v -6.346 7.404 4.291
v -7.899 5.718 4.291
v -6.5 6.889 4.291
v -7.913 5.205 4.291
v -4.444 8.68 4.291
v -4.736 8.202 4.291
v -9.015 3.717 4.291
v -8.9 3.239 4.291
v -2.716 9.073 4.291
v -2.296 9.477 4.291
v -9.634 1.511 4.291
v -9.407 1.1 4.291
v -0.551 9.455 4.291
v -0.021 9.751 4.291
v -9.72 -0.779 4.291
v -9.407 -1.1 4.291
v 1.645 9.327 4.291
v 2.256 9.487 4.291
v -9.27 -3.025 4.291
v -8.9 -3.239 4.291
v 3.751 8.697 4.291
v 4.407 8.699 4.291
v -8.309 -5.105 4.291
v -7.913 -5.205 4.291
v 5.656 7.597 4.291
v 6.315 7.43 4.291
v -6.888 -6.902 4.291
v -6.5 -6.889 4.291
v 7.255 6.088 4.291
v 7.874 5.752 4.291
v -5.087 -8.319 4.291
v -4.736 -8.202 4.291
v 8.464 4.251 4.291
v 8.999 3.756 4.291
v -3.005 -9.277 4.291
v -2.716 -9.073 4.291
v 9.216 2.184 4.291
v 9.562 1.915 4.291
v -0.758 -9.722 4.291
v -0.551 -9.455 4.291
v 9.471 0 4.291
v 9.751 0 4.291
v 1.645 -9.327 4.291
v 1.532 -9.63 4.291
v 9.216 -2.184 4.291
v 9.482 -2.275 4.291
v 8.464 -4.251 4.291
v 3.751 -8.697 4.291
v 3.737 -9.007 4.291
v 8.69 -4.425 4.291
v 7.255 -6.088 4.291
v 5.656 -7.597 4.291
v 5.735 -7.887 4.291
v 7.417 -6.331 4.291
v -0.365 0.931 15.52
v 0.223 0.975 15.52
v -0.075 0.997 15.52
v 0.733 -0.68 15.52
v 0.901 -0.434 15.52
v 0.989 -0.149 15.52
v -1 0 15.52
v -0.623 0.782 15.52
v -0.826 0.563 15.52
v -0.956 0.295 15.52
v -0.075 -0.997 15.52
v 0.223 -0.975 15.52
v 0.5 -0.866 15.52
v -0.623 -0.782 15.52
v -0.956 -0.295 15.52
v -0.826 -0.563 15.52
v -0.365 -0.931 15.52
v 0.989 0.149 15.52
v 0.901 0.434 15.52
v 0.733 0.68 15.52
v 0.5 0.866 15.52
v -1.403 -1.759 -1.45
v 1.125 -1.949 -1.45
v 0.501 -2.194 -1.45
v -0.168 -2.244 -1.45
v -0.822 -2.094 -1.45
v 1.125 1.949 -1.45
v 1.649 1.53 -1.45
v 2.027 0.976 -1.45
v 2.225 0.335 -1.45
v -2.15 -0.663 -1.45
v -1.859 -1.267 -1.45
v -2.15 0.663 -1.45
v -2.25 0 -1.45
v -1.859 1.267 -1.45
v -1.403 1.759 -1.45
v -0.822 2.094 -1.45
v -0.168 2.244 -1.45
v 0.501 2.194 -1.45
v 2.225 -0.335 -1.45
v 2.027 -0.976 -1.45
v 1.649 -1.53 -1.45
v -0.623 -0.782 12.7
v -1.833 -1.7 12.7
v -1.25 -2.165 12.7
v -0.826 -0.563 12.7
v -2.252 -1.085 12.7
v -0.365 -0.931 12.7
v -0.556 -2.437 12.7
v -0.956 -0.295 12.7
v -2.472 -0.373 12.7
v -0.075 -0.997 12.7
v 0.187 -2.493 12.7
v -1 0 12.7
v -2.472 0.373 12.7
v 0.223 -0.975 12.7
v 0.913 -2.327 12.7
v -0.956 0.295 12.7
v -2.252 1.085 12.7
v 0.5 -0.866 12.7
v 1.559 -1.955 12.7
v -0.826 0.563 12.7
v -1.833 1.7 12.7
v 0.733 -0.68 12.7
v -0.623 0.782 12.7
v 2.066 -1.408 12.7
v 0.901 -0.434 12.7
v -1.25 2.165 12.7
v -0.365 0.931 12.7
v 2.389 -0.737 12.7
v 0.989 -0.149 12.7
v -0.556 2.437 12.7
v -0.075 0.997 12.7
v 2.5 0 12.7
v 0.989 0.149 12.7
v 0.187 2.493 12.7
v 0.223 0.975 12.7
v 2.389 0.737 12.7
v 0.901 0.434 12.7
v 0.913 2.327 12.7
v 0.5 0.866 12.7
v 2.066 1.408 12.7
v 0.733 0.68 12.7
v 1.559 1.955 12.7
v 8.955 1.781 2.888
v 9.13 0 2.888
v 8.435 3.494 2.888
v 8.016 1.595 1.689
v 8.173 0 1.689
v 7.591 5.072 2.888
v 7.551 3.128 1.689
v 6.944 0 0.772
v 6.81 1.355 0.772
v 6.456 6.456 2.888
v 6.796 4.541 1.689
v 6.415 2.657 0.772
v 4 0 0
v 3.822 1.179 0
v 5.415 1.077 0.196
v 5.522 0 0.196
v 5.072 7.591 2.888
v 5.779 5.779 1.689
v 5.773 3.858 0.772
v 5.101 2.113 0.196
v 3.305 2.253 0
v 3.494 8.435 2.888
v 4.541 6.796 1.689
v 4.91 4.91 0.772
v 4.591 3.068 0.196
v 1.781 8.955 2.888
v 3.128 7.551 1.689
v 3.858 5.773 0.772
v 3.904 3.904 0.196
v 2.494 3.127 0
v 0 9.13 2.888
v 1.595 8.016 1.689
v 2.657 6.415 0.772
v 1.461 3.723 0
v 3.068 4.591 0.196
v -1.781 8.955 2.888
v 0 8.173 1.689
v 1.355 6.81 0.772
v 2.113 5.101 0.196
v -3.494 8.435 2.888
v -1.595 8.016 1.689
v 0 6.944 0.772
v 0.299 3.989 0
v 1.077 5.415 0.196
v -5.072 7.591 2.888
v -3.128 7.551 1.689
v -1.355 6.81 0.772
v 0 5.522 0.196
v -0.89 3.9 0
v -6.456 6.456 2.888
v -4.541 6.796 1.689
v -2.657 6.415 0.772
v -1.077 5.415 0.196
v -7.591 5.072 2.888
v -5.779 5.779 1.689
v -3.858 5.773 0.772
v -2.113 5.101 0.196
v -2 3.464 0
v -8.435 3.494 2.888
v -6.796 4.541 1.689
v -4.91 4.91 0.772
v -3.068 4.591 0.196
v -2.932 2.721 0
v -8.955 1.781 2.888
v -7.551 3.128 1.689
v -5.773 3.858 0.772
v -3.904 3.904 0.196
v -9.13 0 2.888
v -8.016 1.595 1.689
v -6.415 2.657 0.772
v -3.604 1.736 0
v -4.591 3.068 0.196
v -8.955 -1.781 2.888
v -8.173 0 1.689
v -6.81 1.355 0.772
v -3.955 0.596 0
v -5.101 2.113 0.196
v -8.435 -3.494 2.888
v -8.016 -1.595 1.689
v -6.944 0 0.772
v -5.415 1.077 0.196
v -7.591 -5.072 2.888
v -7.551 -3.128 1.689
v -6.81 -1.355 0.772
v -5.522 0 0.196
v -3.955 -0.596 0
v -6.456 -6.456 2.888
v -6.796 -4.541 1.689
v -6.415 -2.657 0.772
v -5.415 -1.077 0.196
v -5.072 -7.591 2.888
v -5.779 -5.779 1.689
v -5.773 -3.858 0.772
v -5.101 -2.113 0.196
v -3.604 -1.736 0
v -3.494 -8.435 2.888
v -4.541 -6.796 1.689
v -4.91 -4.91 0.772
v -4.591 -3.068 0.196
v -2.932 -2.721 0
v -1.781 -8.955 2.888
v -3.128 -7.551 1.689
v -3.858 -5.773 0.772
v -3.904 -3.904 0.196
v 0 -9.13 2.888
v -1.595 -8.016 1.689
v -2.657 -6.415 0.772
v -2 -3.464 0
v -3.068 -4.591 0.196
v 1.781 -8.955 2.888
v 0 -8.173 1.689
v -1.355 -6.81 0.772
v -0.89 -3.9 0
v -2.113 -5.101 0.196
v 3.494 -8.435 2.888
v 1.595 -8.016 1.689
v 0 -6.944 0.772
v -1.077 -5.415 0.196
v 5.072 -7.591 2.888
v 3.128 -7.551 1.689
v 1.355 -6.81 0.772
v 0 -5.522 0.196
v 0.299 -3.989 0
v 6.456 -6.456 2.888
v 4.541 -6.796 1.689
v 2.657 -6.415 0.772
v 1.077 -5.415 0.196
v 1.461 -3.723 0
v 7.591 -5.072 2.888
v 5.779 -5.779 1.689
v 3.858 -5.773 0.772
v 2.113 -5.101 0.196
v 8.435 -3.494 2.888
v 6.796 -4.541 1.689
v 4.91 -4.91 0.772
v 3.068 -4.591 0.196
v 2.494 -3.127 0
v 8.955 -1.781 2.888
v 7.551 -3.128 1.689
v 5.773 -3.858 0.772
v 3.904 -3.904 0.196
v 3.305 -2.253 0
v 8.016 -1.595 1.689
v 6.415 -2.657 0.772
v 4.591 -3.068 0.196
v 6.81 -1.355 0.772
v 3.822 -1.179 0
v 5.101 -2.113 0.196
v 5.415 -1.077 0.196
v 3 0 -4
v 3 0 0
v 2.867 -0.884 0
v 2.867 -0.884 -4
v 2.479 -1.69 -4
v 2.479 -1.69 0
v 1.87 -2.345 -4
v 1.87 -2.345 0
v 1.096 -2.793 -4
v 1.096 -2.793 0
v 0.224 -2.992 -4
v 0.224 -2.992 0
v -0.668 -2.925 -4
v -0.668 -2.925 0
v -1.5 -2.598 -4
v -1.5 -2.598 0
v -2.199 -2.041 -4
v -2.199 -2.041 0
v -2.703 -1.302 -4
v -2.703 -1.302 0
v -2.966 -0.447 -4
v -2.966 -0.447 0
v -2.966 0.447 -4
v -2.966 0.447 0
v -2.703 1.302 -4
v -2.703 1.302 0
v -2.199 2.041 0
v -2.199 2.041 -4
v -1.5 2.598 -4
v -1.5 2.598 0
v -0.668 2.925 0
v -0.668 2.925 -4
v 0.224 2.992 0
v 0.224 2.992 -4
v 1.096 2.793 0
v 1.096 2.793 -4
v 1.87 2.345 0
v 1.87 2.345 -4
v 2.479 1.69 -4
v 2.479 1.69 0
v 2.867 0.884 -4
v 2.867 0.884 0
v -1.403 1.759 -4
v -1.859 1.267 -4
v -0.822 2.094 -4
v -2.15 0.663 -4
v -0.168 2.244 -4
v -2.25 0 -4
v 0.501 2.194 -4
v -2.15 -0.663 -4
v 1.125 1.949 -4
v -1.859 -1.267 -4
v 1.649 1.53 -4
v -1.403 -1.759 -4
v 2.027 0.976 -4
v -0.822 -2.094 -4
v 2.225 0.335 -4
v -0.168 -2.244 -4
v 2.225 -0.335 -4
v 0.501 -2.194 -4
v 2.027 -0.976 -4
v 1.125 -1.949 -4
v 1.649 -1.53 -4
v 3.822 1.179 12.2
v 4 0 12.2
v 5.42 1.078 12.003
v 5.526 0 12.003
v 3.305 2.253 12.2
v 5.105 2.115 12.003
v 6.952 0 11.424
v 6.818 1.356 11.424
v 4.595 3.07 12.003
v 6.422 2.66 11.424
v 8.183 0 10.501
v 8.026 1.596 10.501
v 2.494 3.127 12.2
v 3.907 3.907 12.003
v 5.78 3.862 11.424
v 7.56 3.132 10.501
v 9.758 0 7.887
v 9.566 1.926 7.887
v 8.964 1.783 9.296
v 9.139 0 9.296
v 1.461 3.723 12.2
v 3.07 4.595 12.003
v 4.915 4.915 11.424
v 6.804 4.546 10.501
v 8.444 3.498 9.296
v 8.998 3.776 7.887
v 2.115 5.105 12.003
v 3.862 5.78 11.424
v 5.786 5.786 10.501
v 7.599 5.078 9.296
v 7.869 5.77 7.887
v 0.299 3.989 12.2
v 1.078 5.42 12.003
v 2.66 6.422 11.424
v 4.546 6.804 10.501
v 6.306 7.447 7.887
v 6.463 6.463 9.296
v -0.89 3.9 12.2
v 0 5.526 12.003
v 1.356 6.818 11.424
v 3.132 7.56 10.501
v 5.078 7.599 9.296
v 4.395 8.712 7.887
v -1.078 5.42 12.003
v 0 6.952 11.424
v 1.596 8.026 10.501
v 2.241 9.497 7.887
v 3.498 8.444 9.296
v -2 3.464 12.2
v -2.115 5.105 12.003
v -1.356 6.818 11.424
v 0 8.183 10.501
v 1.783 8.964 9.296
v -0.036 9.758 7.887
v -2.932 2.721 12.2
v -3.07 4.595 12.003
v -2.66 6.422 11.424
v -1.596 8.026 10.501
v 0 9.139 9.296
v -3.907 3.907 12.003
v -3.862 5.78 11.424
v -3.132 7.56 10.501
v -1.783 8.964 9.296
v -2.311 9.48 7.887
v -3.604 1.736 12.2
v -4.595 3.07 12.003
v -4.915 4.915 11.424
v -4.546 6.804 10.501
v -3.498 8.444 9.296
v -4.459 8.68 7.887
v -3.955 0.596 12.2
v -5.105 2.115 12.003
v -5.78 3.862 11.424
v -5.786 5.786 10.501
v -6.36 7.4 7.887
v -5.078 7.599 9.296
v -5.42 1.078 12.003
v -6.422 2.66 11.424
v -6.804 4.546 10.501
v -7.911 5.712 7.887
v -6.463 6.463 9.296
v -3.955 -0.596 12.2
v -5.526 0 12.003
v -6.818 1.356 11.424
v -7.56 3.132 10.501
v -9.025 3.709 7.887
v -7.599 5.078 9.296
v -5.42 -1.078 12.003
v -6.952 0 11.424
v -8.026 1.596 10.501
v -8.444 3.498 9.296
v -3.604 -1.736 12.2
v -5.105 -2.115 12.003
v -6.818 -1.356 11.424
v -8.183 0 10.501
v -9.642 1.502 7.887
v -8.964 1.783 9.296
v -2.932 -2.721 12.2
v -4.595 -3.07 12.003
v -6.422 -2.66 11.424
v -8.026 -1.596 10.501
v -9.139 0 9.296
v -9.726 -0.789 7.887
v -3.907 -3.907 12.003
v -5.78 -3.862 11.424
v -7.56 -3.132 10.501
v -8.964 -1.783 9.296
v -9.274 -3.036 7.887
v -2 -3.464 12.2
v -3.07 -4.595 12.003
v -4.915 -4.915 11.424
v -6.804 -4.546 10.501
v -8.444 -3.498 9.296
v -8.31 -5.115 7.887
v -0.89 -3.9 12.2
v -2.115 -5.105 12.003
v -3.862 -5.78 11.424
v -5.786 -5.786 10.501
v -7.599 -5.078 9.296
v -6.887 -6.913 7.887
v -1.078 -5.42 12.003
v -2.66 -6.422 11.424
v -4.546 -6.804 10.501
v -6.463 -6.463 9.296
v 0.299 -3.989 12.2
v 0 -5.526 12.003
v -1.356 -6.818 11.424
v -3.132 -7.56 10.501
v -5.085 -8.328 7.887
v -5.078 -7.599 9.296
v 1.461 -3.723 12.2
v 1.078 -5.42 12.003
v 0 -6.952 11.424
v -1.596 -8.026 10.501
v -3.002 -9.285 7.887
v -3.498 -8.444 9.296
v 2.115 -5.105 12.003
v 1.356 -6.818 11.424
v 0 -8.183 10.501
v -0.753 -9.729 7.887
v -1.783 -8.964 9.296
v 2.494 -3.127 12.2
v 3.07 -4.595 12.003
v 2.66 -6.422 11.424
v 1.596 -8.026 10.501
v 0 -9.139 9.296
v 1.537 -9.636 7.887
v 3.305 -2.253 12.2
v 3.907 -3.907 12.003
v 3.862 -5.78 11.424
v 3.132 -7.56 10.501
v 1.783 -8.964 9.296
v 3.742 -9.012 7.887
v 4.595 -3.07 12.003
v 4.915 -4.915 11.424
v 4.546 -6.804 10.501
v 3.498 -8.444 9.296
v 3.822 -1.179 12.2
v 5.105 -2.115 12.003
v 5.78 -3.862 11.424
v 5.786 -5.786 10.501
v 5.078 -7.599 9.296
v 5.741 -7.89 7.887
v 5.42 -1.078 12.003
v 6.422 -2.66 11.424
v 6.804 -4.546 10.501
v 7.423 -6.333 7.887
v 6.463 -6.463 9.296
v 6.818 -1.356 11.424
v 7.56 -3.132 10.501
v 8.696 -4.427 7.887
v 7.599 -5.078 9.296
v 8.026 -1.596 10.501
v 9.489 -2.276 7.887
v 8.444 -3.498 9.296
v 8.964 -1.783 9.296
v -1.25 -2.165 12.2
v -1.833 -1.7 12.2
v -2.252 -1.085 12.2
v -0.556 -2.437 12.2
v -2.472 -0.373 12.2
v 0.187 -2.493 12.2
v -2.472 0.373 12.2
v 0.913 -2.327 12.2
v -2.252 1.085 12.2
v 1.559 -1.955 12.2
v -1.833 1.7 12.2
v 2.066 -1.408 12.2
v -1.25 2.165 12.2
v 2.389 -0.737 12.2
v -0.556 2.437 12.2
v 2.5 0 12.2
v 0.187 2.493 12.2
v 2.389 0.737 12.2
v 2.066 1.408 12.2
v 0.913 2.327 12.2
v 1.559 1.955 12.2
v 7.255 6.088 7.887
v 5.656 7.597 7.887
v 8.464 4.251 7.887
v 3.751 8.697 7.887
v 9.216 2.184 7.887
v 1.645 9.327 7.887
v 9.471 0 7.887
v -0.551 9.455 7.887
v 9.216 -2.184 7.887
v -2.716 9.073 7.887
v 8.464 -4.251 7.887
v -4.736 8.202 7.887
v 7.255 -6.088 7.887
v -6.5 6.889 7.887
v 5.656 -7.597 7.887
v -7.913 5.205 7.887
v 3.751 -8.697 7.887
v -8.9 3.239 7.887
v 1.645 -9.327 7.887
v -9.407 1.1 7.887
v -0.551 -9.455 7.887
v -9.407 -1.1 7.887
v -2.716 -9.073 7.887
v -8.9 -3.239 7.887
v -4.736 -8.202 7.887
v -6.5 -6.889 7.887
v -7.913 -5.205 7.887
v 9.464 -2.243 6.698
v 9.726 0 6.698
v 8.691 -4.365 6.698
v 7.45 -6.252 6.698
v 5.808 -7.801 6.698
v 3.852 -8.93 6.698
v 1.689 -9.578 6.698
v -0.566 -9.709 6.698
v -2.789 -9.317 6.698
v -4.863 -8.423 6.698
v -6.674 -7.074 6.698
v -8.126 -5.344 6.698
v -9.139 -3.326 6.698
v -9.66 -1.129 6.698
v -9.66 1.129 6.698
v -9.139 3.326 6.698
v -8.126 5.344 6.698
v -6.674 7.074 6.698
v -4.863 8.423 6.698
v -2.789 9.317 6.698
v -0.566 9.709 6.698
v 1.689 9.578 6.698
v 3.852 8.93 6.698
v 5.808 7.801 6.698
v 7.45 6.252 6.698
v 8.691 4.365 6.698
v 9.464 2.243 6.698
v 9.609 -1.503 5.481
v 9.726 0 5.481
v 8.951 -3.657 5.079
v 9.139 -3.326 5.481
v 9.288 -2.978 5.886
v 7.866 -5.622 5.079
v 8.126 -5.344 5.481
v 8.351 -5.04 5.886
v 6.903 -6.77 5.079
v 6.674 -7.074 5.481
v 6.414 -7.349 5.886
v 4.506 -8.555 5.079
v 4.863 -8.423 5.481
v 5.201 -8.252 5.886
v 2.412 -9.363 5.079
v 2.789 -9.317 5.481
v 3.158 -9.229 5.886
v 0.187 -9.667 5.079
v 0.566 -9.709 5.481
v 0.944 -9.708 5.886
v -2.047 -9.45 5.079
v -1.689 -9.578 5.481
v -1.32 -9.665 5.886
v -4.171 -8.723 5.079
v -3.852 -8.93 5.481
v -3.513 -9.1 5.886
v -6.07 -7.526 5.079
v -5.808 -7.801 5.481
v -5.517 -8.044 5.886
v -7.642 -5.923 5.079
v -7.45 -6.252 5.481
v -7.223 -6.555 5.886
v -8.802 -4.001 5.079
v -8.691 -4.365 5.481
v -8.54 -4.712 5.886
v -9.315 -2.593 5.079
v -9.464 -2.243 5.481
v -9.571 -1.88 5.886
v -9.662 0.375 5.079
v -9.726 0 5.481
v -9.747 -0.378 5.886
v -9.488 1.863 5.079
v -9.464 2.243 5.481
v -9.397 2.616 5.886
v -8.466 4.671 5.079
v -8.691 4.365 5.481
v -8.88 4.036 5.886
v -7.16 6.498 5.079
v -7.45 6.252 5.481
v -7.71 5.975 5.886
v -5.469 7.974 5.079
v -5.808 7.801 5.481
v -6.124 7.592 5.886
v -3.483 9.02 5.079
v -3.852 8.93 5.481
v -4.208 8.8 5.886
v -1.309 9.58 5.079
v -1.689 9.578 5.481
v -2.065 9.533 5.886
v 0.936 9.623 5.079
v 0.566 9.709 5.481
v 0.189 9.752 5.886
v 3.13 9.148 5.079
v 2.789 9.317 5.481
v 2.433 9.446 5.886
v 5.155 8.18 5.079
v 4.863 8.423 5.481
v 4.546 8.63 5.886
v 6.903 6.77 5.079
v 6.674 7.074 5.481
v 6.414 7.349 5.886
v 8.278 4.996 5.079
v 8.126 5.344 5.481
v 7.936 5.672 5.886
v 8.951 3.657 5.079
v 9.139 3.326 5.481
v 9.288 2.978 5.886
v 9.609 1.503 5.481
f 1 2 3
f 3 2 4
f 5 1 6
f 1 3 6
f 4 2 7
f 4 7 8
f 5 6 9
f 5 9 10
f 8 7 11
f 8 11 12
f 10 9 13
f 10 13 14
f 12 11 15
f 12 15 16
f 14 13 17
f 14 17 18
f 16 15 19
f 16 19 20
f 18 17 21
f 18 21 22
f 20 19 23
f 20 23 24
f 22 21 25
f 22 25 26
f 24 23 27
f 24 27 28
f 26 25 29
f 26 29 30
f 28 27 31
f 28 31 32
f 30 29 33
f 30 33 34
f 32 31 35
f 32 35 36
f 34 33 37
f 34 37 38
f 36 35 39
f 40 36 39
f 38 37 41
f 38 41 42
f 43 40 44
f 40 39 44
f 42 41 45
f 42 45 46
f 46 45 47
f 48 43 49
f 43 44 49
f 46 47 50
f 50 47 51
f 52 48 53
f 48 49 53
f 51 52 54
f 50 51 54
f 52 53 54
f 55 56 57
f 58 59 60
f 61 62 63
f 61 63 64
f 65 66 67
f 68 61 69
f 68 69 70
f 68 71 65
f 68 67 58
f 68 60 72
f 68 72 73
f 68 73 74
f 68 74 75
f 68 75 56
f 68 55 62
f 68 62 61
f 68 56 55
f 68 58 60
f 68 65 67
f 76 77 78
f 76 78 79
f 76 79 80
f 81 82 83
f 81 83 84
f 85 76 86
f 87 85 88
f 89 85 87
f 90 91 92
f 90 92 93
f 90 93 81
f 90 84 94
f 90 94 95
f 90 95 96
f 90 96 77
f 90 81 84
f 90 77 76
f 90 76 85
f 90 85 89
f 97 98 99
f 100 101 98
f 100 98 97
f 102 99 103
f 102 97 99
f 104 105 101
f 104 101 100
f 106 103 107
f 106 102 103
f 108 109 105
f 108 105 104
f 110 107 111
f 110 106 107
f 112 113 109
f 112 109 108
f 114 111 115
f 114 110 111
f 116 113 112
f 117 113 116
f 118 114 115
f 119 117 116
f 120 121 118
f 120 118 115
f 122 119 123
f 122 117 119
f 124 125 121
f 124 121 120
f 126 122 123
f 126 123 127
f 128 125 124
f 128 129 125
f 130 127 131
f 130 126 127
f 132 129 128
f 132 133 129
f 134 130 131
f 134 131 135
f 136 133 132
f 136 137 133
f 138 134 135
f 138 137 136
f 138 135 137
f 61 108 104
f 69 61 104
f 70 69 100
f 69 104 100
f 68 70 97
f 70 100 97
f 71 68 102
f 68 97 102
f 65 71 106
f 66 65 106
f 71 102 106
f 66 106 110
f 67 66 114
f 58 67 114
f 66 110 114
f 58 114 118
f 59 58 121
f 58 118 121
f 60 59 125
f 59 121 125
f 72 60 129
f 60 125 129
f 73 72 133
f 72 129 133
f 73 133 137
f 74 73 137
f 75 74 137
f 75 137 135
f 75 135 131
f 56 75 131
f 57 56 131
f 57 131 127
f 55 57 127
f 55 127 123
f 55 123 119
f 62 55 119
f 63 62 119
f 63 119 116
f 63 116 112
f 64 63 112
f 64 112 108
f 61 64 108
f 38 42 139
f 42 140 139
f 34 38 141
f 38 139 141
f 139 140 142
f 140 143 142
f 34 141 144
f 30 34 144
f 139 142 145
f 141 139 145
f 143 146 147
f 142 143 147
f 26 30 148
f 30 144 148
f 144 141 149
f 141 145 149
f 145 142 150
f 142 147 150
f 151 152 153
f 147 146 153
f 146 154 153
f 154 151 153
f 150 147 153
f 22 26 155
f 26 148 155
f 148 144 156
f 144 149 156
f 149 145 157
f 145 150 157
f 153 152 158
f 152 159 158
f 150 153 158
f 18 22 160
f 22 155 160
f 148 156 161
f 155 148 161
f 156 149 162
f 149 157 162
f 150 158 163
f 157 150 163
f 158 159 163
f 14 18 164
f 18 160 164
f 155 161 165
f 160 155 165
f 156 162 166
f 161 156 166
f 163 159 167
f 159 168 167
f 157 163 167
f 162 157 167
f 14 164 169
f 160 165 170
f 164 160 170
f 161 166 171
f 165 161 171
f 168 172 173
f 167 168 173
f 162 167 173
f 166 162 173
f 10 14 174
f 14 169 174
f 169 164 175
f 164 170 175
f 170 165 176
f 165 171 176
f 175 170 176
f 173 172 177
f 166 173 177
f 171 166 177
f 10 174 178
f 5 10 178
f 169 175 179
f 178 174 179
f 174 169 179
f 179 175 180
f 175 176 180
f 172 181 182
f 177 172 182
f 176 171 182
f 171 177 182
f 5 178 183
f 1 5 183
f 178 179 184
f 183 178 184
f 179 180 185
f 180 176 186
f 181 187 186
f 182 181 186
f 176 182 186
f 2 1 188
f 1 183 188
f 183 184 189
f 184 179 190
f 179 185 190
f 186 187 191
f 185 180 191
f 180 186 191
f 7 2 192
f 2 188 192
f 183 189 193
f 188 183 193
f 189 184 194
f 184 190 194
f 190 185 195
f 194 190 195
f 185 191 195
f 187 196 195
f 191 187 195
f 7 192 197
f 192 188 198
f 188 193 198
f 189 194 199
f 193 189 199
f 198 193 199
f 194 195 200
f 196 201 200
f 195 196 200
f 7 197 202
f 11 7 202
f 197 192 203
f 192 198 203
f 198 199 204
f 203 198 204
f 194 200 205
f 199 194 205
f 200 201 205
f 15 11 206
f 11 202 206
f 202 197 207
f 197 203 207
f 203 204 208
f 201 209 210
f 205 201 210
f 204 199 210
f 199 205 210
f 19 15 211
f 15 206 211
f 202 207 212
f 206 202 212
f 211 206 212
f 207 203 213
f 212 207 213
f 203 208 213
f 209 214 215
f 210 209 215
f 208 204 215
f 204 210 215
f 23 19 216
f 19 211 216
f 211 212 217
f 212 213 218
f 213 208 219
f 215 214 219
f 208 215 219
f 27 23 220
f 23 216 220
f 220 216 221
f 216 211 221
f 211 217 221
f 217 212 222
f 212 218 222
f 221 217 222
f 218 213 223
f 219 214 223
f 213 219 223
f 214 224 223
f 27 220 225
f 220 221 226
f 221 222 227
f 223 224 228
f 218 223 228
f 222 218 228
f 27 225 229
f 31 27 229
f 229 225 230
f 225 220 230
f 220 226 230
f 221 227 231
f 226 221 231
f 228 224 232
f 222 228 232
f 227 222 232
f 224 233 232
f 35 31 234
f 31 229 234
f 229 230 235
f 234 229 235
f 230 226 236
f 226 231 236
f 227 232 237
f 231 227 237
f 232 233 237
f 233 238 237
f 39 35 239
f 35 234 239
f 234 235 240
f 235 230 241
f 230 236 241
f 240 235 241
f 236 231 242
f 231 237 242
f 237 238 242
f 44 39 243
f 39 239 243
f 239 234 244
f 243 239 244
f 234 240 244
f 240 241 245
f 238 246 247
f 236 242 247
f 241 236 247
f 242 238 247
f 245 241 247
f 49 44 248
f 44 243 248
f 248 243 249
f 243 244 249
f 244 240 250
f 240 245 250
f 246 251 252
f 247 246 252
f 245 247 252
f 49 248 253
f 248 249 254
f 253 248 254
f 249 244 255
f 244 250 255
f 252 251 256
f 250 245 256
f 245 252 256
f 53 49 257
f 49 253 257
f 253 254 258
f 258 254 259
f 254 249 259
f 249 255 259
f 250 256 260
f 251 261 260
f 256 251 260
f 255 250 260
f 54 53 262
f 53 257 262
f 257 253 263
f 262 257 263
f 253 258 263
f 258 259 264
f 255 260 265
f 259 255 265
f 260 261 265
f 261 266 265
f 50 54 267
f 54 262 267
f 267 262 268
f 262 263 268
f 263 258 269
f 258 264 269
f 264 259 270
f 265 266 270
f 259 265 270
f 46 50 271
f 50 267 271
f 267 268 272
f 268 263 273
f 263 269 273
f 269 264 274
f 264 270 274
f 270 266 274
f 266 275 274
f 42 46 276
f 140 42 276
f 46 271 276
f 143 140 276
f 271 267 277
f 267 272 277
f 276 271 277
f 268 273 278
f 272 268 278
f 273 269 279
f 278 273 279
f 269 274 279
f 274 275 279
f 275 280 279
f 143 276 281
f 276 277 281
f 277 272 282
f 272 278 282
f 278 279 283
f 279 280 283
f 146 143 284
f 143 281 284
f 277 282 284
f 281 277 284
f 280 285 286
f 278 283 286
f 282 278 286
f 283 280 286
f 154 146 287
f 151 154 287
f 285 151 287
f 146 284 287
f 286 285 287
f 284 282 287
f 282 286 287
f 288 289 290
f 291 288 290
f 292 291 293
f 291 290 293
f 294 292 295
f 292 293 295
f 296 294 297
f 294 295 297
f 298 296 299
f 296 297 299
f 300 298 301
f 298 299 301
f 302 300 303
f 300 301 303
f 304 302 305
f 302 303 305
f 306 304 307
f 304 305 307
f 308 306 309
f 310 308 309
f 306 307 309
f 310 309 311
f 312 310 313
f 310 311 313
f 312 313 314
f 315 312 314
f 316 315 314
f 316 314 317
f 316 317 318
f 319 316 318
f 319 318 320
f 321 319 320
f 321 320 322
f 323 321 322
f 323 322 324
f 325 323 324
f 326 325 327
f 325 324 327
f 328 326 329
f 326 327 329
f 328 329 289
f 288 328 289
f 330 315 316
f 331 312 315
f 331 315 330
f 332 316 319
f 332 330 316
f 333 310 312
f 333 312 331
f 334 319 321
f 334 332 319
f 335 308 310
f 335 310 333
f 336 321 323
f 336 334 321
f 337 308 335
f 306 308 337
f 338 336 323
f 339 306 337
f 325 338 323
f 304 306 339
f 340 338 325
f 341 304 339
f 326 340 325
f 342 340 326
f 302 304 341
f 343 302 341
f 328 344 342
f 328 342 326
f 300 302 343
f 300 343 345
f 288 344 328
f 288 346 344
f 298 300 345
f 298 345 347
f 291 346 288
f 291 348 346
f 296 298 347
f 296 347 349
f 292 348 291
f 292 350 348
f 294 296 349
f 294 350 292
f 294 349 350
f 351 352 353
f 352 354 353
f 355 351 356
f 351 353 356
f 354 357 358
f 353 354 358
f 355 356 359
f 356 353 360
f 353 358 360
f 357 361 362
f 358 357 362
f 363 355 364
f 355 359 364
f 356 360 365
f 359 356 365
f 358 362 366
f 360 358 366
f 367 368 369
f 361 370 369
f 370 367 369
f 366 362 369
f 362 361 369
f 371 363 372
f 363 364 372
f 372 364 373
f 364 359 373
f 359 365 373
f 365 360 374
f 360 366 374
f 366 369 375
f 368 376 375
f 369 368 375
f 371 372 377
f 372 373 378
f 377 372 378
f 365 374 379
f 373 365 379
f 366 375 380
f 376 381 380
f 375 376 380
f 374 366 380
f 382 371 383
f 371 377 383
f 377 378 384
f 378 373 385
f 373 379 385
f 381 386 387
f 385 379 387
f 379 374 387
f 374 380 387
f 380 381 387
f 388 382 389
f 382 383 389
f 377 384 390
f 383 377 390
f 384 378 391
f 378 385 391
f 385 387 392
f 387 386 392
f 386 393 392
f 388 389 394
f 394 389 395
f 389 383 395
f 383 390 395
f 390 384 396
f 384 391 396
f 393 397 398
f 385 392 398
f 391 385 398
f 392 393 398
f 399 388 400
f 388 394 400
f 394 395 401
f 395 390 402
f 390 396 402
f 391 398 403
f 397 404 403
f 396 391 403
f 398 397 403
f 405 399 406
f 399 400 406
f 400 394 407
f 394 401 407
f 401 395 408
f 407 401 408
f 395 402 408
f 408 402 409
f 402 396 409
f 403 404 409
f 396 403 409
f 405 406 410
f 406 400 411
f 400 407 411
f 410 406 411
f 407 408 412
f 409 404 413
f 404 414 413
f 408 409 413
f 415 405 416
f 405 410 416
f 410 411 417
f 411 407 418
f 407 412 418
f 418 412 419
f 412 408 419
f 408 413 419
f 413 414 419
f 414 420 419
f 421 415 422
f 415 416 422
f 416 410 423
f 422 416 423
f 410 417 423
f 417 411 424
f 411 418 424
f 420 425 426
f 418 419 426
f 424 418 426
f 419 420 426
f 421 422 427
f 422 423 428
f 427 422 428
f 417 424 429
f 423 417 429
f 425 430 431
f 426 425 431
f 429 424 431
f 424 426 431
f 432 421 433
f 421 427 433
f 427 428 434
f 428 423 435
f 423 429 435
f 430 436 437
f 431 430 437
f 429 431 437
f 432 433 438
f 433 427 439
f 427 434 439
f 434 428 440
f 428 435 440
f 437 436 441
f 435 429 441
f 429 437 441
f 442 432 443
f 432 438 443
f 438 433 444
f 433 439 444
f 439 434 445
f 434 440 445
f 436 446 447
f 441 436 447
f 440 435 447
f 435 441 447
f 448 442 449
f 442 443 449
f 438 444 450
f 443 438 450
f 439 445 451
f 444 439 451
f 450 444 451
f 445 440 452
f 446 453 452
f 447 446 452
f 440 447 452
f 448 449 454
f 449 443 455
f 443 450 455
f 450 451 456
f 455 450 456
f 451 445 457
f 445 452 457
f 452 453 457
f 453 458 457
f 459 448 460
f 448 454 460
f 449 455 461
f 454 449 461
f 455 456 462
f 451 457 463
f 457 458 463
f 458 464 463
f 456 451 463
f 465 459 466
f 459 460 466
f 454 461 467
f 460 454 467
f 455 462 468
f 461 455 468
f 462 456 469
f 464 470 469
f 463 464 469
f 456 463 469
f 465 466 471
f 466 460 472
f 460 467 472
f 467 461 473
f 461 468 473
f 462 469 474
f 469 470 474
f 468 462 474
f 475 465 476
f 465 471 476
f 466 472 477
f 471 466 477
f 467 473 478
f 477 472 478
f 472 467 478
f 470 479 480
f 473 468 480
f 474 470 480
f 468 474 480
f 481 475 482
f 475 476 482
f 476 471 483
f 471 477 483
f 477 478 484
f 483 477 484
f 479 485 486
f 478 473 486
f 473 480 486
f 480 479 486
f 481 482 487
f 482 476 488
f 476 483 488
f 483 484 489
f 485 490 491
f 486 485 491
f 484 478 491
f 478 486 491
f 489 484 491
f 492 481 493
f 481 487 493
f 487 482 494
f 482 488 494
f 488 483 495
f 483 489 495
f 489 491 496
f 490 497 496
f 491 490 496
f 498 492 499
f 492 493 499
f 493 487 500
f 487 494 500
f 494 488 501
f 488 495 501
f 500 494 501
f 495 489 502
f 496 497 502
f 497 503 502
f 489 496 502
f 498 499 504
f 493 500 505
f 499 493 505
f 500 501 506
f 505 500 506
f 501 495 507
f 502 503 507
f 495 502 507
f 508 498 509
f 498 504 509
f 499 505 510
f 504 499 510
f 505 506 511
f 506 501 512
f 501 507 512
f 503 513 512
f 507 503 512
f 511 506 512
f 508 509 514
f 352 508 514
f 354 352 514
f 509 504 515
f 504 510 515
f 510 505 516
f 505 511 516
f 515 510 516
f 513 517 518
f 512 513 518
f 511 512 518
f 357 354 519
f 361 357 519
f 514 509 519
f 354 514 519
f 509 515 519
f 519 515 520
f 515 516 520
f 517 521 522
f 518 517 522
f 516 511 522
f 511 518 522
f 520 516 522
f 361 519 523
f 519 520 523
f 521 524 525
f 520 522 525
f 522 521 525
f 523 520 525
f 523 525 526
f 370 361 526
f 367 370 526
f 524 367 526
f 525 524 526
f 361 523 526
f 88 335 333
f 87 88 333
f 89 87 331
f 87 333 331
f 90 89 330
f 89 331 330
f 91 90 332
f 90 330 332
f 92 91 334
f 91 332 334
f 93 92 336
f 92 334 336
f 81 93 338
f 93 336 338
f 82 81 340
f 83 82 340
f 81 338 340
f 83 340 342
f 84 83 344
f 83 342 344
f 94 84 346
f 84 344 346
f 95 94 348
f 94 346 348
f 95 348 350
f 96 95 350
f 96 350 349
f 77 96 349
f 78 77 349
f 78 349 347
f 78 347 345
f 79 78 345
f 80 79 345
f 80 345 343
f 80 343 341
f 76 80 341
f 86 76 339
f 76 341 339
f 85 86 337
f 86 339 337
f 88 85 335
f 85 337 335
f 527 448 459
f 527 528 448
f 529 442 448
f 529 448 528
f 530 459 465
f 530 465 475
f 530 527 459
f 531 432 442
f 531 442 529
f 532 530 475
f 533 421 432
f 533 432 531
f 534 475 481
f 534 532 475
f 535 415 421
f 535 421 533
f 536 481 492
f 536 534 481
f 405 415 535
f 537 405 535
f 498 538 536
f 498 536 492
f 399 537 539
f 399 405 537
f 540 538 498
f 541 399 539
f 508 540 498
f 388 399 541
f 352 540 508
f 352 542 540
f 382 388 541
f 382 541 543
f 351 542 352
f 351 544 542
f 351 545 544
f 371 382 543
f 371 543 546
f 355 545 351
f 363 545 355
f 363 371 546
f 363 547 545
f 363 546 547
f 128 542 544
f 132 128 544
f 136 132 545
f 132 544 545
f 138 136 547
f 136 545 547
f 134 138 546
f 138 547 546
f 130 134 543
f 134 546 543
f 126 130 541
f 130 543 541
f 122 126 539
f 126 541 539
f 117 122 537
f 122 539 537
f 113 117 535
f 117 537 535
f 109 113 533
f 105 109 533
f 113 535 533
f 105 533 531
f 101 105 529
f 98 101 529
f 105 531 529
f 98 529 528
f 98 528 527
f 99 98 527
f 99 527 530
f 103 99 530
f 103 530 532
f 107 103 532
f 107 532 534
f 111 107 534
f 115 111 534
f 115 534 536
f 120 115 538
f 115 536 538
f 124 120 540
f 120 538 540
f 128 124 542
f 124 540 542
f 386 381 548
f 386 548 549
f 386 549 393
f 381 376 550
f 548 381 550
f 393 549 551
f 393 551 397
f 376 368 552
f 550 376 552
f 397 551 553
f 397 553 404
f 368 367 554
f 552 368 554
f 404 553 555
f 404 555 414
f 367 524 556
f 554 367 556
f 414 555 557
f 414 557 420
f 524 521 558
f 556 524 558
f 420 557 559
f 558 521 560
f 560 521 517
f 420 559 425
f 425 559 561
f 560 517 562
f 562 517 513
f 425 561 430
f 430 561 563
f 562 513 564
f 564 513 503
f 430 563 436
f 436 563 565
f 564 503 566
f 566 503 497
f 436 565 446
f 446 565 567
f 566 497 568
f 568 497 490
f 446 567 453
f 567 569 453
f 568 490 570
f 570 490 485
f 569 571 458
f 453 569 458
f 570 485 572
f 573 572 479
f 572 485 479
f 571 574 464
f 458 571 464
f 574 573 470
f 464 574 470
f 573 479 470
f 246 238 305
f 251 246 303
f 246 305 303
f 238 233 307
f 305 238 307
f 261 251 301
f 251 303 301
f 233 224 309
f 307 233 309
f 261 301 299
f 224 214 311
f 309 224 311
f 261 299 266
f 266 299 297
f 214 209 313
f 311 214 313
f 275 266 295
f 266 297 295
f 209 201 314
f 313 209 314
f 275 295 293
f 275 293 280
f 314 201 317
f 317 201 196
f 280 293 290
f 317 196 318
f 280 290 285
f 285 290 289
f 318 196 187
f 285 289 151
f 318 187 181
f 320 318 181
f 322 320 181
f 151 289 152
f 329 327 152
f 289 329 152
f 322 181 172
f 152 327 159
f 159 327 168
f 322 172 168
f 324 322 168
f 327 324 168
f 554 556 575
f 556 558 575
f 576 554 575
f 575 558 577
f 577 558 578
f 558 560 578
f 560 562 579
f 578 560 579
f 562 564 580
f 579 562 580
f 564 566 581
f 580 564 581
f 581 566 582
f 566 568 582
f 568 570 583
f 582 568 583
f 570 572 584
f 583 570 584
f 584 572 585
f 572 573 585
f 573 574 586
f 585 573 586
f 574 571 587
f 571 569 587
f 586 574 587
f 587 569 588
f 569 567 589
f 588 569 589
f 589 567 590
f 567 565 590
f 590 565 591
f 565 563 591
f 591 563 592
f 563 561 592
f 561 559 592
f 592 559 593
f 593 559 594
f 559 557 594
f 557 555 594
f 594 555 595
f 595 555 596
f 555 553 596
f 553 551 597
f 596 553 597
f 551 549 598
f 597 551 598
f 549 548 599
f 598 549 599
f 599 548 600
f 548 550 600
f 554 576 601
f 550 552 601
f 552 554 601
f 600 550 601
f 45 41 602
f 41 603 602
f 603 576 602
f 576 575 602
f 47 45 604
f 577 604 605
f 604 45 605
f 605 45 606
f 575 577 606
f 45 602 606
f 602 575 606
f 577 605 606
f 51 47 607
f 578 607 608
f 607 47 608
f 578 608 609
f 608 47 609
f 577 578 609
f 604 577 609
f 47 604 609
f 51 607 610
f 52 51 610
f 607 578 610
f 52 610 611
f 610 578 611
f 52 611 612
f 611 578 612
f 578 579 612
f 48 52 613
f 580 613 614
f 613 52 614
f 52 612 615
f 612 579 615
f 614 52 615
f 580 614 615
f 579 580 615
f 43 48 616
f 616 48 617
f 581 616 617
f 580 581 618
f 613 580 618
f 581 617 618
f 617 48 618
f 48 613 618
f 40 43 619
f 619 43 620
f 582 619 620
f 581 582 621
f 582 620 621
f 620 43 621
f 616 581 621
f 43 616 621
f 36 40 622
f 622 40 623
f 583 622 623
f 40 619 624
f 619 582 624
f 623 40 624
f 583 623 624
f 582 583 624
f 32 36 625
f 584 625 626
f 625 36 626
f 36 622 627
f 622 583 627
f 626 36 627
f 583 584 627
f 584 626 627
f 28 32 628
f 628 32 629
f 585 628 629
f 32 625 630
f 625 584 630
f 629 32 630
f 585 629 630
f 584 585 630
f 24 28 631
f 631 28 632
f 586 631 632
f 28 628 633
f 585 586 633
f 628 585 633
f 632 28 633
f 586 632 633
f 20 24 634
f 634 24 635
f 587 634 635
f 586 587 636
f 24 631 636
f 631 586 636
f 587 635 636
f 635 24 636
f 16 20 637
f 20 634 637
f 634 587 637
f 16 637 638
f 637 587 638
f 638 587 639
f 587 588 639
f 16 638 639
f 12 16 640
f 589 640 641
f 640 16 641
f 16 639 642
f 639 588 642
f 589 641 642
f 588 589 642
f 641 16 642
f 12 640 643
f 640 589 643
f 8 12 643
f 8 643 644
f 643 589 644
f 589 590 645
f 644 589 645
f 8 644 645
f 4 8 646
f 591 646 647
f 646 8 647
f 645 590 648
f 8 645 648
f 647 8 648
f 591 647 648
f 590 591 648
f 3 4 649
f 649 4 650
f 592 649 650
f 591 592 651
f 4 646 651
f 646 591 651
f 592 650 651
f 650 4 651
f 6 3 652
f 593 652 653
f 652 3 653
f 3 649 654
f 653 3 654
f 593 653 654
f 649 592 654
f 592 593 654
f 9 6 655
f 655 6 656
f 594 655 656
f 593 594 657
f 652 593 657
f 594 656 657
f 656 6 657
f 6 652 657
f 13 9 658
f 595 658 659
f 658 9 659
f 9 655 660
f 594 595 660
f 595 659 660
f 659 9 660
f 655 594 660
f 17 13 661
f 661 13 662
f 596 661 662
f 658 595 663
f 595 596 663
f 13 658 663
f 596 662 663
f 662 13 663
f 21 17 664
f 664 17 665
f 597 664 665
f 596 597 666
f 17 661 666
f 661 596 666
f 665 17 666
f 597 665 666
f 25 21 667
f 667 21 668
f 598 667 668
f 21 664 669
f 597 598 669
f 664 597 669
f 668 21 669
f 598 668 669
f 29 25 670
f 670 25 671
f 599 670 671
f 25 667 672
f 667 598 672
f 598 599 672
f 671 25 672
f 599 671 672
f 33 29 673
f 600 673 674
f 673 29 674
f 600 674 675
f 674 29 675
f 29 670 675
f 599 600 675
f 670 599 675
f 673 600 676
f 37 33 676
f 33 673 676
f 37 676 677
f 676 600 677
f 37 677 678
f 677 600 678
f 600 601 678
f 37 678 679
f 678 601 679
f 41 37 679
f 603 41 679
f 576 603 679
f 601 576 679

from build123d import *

# Parameters (mm, degrees)
SKETCH1_R           = 10
BOSS_EXTRUDE1_DEPTH = 12.2
SKETCH4_R           = 2.5
BOSS_EXTRUDE3_DEPTH = 0.5
SKETCH5_R           = 1
BOSS_EXTRUDE4_DEPTH = 3.32
FILLET1_R           = 6
SKETCH2_R           = 3
BOSS_EXTRUDE2_DEPTH = 4
SKETCH6_R           = 2.25
CUT_EXTRUDE1_DEPTH  = 2.55


with BuildPart() as part:
    # Sketch1 → Boss-Extrude1 (new body)
    with BuildSketch(Plane.XY):
        Circle(SKETCH1_R)
    extrude(amount=BOSS_EXTRUDE1_DEPTH)

    # Sketch4 → Boss-Extrude3 (add)
    with BuildSketch(Plane.XY.offset(12.2)):
        Circle(SKETCH4_R)
    extrude(amount=BOSS_EXTRUDE3_DEPTH)

    # Sketch5 → Boss-Extrude4 (add)
    with BuildSketch(Plane.XY.offset(12.2)):
        with Locations(Location((0, 0, 0), (0, 0, 180))):
            Circle(SKETCH5_R)
    extrude(amount=BOSS_EXTRUDE4_DEPTH)

    # Fillet1
    fillet1_edges = [part.edges().sort_by_distance(p)[0] for p in [
        (-10, 0, 0),
        (-10, 0, 12.2),
    ]]
    fillet(fillet1_edges, radius=FILLET1_R)

    # Sketch2 → Boss-Extrude2 (add)
    with BuildSketch(Plane(origin=(0, 0, 0), x_dir=(-1, 0, 0), z_dir=(0, 0, -1))):
        with Locations(Location((0, 0, 0), (0, 0, 180))):
            Circle(SKETCH2_R)
    extrude(amount=BOSS_EXTRUDE2_DEPTH)

    # Sketch6 → Cut-Extrude1 (cut)
    with BuildSketch(Plane(origin=(0, 0, -4), x_dir=(-1, 0, 0), z_dir=(0, 0, -1))):
        Circle(SKETCH6_R)
    extrude(amount=-CUT_EXTRUDE1_DEPTH, mode=Mode.SUBTRACT)

    # Sketch7 → Cut-Revolve1 (revolve, cut)
    with BuildSketch(Plane(origin=(0, 0, 0), x_dir=(0, 0, -1), z_dir=(1, 0, 0)), mode=Mode.PRIVATE) as cut_revolve1_sk:
        with BuildLine():
            Line((-7.887262955, 10.599100827), (-4.29107992, 10.599100827))
            Line((-4.29107992, 10.599100827), (-4.29107992, 9.471207056))
            ThreePointArc((-4.29107992, 9.471207056), (-6.089171437, 9.757850623), (-7.887262955, 9.471207056))
            Line((-7.887262955, 9.471207056), (-7.887262955, 10.599100827))
        make_face()
    revolve(cut_revolve1_sk.sketch.rotate(Axis((0, 0, 15.193399994), (0, 0, -1)), 90), axis=Axis((0, 0, 15.193399994), (0, 0, -1)), mode=Mode.SUBTRACT)


solid = part.part
